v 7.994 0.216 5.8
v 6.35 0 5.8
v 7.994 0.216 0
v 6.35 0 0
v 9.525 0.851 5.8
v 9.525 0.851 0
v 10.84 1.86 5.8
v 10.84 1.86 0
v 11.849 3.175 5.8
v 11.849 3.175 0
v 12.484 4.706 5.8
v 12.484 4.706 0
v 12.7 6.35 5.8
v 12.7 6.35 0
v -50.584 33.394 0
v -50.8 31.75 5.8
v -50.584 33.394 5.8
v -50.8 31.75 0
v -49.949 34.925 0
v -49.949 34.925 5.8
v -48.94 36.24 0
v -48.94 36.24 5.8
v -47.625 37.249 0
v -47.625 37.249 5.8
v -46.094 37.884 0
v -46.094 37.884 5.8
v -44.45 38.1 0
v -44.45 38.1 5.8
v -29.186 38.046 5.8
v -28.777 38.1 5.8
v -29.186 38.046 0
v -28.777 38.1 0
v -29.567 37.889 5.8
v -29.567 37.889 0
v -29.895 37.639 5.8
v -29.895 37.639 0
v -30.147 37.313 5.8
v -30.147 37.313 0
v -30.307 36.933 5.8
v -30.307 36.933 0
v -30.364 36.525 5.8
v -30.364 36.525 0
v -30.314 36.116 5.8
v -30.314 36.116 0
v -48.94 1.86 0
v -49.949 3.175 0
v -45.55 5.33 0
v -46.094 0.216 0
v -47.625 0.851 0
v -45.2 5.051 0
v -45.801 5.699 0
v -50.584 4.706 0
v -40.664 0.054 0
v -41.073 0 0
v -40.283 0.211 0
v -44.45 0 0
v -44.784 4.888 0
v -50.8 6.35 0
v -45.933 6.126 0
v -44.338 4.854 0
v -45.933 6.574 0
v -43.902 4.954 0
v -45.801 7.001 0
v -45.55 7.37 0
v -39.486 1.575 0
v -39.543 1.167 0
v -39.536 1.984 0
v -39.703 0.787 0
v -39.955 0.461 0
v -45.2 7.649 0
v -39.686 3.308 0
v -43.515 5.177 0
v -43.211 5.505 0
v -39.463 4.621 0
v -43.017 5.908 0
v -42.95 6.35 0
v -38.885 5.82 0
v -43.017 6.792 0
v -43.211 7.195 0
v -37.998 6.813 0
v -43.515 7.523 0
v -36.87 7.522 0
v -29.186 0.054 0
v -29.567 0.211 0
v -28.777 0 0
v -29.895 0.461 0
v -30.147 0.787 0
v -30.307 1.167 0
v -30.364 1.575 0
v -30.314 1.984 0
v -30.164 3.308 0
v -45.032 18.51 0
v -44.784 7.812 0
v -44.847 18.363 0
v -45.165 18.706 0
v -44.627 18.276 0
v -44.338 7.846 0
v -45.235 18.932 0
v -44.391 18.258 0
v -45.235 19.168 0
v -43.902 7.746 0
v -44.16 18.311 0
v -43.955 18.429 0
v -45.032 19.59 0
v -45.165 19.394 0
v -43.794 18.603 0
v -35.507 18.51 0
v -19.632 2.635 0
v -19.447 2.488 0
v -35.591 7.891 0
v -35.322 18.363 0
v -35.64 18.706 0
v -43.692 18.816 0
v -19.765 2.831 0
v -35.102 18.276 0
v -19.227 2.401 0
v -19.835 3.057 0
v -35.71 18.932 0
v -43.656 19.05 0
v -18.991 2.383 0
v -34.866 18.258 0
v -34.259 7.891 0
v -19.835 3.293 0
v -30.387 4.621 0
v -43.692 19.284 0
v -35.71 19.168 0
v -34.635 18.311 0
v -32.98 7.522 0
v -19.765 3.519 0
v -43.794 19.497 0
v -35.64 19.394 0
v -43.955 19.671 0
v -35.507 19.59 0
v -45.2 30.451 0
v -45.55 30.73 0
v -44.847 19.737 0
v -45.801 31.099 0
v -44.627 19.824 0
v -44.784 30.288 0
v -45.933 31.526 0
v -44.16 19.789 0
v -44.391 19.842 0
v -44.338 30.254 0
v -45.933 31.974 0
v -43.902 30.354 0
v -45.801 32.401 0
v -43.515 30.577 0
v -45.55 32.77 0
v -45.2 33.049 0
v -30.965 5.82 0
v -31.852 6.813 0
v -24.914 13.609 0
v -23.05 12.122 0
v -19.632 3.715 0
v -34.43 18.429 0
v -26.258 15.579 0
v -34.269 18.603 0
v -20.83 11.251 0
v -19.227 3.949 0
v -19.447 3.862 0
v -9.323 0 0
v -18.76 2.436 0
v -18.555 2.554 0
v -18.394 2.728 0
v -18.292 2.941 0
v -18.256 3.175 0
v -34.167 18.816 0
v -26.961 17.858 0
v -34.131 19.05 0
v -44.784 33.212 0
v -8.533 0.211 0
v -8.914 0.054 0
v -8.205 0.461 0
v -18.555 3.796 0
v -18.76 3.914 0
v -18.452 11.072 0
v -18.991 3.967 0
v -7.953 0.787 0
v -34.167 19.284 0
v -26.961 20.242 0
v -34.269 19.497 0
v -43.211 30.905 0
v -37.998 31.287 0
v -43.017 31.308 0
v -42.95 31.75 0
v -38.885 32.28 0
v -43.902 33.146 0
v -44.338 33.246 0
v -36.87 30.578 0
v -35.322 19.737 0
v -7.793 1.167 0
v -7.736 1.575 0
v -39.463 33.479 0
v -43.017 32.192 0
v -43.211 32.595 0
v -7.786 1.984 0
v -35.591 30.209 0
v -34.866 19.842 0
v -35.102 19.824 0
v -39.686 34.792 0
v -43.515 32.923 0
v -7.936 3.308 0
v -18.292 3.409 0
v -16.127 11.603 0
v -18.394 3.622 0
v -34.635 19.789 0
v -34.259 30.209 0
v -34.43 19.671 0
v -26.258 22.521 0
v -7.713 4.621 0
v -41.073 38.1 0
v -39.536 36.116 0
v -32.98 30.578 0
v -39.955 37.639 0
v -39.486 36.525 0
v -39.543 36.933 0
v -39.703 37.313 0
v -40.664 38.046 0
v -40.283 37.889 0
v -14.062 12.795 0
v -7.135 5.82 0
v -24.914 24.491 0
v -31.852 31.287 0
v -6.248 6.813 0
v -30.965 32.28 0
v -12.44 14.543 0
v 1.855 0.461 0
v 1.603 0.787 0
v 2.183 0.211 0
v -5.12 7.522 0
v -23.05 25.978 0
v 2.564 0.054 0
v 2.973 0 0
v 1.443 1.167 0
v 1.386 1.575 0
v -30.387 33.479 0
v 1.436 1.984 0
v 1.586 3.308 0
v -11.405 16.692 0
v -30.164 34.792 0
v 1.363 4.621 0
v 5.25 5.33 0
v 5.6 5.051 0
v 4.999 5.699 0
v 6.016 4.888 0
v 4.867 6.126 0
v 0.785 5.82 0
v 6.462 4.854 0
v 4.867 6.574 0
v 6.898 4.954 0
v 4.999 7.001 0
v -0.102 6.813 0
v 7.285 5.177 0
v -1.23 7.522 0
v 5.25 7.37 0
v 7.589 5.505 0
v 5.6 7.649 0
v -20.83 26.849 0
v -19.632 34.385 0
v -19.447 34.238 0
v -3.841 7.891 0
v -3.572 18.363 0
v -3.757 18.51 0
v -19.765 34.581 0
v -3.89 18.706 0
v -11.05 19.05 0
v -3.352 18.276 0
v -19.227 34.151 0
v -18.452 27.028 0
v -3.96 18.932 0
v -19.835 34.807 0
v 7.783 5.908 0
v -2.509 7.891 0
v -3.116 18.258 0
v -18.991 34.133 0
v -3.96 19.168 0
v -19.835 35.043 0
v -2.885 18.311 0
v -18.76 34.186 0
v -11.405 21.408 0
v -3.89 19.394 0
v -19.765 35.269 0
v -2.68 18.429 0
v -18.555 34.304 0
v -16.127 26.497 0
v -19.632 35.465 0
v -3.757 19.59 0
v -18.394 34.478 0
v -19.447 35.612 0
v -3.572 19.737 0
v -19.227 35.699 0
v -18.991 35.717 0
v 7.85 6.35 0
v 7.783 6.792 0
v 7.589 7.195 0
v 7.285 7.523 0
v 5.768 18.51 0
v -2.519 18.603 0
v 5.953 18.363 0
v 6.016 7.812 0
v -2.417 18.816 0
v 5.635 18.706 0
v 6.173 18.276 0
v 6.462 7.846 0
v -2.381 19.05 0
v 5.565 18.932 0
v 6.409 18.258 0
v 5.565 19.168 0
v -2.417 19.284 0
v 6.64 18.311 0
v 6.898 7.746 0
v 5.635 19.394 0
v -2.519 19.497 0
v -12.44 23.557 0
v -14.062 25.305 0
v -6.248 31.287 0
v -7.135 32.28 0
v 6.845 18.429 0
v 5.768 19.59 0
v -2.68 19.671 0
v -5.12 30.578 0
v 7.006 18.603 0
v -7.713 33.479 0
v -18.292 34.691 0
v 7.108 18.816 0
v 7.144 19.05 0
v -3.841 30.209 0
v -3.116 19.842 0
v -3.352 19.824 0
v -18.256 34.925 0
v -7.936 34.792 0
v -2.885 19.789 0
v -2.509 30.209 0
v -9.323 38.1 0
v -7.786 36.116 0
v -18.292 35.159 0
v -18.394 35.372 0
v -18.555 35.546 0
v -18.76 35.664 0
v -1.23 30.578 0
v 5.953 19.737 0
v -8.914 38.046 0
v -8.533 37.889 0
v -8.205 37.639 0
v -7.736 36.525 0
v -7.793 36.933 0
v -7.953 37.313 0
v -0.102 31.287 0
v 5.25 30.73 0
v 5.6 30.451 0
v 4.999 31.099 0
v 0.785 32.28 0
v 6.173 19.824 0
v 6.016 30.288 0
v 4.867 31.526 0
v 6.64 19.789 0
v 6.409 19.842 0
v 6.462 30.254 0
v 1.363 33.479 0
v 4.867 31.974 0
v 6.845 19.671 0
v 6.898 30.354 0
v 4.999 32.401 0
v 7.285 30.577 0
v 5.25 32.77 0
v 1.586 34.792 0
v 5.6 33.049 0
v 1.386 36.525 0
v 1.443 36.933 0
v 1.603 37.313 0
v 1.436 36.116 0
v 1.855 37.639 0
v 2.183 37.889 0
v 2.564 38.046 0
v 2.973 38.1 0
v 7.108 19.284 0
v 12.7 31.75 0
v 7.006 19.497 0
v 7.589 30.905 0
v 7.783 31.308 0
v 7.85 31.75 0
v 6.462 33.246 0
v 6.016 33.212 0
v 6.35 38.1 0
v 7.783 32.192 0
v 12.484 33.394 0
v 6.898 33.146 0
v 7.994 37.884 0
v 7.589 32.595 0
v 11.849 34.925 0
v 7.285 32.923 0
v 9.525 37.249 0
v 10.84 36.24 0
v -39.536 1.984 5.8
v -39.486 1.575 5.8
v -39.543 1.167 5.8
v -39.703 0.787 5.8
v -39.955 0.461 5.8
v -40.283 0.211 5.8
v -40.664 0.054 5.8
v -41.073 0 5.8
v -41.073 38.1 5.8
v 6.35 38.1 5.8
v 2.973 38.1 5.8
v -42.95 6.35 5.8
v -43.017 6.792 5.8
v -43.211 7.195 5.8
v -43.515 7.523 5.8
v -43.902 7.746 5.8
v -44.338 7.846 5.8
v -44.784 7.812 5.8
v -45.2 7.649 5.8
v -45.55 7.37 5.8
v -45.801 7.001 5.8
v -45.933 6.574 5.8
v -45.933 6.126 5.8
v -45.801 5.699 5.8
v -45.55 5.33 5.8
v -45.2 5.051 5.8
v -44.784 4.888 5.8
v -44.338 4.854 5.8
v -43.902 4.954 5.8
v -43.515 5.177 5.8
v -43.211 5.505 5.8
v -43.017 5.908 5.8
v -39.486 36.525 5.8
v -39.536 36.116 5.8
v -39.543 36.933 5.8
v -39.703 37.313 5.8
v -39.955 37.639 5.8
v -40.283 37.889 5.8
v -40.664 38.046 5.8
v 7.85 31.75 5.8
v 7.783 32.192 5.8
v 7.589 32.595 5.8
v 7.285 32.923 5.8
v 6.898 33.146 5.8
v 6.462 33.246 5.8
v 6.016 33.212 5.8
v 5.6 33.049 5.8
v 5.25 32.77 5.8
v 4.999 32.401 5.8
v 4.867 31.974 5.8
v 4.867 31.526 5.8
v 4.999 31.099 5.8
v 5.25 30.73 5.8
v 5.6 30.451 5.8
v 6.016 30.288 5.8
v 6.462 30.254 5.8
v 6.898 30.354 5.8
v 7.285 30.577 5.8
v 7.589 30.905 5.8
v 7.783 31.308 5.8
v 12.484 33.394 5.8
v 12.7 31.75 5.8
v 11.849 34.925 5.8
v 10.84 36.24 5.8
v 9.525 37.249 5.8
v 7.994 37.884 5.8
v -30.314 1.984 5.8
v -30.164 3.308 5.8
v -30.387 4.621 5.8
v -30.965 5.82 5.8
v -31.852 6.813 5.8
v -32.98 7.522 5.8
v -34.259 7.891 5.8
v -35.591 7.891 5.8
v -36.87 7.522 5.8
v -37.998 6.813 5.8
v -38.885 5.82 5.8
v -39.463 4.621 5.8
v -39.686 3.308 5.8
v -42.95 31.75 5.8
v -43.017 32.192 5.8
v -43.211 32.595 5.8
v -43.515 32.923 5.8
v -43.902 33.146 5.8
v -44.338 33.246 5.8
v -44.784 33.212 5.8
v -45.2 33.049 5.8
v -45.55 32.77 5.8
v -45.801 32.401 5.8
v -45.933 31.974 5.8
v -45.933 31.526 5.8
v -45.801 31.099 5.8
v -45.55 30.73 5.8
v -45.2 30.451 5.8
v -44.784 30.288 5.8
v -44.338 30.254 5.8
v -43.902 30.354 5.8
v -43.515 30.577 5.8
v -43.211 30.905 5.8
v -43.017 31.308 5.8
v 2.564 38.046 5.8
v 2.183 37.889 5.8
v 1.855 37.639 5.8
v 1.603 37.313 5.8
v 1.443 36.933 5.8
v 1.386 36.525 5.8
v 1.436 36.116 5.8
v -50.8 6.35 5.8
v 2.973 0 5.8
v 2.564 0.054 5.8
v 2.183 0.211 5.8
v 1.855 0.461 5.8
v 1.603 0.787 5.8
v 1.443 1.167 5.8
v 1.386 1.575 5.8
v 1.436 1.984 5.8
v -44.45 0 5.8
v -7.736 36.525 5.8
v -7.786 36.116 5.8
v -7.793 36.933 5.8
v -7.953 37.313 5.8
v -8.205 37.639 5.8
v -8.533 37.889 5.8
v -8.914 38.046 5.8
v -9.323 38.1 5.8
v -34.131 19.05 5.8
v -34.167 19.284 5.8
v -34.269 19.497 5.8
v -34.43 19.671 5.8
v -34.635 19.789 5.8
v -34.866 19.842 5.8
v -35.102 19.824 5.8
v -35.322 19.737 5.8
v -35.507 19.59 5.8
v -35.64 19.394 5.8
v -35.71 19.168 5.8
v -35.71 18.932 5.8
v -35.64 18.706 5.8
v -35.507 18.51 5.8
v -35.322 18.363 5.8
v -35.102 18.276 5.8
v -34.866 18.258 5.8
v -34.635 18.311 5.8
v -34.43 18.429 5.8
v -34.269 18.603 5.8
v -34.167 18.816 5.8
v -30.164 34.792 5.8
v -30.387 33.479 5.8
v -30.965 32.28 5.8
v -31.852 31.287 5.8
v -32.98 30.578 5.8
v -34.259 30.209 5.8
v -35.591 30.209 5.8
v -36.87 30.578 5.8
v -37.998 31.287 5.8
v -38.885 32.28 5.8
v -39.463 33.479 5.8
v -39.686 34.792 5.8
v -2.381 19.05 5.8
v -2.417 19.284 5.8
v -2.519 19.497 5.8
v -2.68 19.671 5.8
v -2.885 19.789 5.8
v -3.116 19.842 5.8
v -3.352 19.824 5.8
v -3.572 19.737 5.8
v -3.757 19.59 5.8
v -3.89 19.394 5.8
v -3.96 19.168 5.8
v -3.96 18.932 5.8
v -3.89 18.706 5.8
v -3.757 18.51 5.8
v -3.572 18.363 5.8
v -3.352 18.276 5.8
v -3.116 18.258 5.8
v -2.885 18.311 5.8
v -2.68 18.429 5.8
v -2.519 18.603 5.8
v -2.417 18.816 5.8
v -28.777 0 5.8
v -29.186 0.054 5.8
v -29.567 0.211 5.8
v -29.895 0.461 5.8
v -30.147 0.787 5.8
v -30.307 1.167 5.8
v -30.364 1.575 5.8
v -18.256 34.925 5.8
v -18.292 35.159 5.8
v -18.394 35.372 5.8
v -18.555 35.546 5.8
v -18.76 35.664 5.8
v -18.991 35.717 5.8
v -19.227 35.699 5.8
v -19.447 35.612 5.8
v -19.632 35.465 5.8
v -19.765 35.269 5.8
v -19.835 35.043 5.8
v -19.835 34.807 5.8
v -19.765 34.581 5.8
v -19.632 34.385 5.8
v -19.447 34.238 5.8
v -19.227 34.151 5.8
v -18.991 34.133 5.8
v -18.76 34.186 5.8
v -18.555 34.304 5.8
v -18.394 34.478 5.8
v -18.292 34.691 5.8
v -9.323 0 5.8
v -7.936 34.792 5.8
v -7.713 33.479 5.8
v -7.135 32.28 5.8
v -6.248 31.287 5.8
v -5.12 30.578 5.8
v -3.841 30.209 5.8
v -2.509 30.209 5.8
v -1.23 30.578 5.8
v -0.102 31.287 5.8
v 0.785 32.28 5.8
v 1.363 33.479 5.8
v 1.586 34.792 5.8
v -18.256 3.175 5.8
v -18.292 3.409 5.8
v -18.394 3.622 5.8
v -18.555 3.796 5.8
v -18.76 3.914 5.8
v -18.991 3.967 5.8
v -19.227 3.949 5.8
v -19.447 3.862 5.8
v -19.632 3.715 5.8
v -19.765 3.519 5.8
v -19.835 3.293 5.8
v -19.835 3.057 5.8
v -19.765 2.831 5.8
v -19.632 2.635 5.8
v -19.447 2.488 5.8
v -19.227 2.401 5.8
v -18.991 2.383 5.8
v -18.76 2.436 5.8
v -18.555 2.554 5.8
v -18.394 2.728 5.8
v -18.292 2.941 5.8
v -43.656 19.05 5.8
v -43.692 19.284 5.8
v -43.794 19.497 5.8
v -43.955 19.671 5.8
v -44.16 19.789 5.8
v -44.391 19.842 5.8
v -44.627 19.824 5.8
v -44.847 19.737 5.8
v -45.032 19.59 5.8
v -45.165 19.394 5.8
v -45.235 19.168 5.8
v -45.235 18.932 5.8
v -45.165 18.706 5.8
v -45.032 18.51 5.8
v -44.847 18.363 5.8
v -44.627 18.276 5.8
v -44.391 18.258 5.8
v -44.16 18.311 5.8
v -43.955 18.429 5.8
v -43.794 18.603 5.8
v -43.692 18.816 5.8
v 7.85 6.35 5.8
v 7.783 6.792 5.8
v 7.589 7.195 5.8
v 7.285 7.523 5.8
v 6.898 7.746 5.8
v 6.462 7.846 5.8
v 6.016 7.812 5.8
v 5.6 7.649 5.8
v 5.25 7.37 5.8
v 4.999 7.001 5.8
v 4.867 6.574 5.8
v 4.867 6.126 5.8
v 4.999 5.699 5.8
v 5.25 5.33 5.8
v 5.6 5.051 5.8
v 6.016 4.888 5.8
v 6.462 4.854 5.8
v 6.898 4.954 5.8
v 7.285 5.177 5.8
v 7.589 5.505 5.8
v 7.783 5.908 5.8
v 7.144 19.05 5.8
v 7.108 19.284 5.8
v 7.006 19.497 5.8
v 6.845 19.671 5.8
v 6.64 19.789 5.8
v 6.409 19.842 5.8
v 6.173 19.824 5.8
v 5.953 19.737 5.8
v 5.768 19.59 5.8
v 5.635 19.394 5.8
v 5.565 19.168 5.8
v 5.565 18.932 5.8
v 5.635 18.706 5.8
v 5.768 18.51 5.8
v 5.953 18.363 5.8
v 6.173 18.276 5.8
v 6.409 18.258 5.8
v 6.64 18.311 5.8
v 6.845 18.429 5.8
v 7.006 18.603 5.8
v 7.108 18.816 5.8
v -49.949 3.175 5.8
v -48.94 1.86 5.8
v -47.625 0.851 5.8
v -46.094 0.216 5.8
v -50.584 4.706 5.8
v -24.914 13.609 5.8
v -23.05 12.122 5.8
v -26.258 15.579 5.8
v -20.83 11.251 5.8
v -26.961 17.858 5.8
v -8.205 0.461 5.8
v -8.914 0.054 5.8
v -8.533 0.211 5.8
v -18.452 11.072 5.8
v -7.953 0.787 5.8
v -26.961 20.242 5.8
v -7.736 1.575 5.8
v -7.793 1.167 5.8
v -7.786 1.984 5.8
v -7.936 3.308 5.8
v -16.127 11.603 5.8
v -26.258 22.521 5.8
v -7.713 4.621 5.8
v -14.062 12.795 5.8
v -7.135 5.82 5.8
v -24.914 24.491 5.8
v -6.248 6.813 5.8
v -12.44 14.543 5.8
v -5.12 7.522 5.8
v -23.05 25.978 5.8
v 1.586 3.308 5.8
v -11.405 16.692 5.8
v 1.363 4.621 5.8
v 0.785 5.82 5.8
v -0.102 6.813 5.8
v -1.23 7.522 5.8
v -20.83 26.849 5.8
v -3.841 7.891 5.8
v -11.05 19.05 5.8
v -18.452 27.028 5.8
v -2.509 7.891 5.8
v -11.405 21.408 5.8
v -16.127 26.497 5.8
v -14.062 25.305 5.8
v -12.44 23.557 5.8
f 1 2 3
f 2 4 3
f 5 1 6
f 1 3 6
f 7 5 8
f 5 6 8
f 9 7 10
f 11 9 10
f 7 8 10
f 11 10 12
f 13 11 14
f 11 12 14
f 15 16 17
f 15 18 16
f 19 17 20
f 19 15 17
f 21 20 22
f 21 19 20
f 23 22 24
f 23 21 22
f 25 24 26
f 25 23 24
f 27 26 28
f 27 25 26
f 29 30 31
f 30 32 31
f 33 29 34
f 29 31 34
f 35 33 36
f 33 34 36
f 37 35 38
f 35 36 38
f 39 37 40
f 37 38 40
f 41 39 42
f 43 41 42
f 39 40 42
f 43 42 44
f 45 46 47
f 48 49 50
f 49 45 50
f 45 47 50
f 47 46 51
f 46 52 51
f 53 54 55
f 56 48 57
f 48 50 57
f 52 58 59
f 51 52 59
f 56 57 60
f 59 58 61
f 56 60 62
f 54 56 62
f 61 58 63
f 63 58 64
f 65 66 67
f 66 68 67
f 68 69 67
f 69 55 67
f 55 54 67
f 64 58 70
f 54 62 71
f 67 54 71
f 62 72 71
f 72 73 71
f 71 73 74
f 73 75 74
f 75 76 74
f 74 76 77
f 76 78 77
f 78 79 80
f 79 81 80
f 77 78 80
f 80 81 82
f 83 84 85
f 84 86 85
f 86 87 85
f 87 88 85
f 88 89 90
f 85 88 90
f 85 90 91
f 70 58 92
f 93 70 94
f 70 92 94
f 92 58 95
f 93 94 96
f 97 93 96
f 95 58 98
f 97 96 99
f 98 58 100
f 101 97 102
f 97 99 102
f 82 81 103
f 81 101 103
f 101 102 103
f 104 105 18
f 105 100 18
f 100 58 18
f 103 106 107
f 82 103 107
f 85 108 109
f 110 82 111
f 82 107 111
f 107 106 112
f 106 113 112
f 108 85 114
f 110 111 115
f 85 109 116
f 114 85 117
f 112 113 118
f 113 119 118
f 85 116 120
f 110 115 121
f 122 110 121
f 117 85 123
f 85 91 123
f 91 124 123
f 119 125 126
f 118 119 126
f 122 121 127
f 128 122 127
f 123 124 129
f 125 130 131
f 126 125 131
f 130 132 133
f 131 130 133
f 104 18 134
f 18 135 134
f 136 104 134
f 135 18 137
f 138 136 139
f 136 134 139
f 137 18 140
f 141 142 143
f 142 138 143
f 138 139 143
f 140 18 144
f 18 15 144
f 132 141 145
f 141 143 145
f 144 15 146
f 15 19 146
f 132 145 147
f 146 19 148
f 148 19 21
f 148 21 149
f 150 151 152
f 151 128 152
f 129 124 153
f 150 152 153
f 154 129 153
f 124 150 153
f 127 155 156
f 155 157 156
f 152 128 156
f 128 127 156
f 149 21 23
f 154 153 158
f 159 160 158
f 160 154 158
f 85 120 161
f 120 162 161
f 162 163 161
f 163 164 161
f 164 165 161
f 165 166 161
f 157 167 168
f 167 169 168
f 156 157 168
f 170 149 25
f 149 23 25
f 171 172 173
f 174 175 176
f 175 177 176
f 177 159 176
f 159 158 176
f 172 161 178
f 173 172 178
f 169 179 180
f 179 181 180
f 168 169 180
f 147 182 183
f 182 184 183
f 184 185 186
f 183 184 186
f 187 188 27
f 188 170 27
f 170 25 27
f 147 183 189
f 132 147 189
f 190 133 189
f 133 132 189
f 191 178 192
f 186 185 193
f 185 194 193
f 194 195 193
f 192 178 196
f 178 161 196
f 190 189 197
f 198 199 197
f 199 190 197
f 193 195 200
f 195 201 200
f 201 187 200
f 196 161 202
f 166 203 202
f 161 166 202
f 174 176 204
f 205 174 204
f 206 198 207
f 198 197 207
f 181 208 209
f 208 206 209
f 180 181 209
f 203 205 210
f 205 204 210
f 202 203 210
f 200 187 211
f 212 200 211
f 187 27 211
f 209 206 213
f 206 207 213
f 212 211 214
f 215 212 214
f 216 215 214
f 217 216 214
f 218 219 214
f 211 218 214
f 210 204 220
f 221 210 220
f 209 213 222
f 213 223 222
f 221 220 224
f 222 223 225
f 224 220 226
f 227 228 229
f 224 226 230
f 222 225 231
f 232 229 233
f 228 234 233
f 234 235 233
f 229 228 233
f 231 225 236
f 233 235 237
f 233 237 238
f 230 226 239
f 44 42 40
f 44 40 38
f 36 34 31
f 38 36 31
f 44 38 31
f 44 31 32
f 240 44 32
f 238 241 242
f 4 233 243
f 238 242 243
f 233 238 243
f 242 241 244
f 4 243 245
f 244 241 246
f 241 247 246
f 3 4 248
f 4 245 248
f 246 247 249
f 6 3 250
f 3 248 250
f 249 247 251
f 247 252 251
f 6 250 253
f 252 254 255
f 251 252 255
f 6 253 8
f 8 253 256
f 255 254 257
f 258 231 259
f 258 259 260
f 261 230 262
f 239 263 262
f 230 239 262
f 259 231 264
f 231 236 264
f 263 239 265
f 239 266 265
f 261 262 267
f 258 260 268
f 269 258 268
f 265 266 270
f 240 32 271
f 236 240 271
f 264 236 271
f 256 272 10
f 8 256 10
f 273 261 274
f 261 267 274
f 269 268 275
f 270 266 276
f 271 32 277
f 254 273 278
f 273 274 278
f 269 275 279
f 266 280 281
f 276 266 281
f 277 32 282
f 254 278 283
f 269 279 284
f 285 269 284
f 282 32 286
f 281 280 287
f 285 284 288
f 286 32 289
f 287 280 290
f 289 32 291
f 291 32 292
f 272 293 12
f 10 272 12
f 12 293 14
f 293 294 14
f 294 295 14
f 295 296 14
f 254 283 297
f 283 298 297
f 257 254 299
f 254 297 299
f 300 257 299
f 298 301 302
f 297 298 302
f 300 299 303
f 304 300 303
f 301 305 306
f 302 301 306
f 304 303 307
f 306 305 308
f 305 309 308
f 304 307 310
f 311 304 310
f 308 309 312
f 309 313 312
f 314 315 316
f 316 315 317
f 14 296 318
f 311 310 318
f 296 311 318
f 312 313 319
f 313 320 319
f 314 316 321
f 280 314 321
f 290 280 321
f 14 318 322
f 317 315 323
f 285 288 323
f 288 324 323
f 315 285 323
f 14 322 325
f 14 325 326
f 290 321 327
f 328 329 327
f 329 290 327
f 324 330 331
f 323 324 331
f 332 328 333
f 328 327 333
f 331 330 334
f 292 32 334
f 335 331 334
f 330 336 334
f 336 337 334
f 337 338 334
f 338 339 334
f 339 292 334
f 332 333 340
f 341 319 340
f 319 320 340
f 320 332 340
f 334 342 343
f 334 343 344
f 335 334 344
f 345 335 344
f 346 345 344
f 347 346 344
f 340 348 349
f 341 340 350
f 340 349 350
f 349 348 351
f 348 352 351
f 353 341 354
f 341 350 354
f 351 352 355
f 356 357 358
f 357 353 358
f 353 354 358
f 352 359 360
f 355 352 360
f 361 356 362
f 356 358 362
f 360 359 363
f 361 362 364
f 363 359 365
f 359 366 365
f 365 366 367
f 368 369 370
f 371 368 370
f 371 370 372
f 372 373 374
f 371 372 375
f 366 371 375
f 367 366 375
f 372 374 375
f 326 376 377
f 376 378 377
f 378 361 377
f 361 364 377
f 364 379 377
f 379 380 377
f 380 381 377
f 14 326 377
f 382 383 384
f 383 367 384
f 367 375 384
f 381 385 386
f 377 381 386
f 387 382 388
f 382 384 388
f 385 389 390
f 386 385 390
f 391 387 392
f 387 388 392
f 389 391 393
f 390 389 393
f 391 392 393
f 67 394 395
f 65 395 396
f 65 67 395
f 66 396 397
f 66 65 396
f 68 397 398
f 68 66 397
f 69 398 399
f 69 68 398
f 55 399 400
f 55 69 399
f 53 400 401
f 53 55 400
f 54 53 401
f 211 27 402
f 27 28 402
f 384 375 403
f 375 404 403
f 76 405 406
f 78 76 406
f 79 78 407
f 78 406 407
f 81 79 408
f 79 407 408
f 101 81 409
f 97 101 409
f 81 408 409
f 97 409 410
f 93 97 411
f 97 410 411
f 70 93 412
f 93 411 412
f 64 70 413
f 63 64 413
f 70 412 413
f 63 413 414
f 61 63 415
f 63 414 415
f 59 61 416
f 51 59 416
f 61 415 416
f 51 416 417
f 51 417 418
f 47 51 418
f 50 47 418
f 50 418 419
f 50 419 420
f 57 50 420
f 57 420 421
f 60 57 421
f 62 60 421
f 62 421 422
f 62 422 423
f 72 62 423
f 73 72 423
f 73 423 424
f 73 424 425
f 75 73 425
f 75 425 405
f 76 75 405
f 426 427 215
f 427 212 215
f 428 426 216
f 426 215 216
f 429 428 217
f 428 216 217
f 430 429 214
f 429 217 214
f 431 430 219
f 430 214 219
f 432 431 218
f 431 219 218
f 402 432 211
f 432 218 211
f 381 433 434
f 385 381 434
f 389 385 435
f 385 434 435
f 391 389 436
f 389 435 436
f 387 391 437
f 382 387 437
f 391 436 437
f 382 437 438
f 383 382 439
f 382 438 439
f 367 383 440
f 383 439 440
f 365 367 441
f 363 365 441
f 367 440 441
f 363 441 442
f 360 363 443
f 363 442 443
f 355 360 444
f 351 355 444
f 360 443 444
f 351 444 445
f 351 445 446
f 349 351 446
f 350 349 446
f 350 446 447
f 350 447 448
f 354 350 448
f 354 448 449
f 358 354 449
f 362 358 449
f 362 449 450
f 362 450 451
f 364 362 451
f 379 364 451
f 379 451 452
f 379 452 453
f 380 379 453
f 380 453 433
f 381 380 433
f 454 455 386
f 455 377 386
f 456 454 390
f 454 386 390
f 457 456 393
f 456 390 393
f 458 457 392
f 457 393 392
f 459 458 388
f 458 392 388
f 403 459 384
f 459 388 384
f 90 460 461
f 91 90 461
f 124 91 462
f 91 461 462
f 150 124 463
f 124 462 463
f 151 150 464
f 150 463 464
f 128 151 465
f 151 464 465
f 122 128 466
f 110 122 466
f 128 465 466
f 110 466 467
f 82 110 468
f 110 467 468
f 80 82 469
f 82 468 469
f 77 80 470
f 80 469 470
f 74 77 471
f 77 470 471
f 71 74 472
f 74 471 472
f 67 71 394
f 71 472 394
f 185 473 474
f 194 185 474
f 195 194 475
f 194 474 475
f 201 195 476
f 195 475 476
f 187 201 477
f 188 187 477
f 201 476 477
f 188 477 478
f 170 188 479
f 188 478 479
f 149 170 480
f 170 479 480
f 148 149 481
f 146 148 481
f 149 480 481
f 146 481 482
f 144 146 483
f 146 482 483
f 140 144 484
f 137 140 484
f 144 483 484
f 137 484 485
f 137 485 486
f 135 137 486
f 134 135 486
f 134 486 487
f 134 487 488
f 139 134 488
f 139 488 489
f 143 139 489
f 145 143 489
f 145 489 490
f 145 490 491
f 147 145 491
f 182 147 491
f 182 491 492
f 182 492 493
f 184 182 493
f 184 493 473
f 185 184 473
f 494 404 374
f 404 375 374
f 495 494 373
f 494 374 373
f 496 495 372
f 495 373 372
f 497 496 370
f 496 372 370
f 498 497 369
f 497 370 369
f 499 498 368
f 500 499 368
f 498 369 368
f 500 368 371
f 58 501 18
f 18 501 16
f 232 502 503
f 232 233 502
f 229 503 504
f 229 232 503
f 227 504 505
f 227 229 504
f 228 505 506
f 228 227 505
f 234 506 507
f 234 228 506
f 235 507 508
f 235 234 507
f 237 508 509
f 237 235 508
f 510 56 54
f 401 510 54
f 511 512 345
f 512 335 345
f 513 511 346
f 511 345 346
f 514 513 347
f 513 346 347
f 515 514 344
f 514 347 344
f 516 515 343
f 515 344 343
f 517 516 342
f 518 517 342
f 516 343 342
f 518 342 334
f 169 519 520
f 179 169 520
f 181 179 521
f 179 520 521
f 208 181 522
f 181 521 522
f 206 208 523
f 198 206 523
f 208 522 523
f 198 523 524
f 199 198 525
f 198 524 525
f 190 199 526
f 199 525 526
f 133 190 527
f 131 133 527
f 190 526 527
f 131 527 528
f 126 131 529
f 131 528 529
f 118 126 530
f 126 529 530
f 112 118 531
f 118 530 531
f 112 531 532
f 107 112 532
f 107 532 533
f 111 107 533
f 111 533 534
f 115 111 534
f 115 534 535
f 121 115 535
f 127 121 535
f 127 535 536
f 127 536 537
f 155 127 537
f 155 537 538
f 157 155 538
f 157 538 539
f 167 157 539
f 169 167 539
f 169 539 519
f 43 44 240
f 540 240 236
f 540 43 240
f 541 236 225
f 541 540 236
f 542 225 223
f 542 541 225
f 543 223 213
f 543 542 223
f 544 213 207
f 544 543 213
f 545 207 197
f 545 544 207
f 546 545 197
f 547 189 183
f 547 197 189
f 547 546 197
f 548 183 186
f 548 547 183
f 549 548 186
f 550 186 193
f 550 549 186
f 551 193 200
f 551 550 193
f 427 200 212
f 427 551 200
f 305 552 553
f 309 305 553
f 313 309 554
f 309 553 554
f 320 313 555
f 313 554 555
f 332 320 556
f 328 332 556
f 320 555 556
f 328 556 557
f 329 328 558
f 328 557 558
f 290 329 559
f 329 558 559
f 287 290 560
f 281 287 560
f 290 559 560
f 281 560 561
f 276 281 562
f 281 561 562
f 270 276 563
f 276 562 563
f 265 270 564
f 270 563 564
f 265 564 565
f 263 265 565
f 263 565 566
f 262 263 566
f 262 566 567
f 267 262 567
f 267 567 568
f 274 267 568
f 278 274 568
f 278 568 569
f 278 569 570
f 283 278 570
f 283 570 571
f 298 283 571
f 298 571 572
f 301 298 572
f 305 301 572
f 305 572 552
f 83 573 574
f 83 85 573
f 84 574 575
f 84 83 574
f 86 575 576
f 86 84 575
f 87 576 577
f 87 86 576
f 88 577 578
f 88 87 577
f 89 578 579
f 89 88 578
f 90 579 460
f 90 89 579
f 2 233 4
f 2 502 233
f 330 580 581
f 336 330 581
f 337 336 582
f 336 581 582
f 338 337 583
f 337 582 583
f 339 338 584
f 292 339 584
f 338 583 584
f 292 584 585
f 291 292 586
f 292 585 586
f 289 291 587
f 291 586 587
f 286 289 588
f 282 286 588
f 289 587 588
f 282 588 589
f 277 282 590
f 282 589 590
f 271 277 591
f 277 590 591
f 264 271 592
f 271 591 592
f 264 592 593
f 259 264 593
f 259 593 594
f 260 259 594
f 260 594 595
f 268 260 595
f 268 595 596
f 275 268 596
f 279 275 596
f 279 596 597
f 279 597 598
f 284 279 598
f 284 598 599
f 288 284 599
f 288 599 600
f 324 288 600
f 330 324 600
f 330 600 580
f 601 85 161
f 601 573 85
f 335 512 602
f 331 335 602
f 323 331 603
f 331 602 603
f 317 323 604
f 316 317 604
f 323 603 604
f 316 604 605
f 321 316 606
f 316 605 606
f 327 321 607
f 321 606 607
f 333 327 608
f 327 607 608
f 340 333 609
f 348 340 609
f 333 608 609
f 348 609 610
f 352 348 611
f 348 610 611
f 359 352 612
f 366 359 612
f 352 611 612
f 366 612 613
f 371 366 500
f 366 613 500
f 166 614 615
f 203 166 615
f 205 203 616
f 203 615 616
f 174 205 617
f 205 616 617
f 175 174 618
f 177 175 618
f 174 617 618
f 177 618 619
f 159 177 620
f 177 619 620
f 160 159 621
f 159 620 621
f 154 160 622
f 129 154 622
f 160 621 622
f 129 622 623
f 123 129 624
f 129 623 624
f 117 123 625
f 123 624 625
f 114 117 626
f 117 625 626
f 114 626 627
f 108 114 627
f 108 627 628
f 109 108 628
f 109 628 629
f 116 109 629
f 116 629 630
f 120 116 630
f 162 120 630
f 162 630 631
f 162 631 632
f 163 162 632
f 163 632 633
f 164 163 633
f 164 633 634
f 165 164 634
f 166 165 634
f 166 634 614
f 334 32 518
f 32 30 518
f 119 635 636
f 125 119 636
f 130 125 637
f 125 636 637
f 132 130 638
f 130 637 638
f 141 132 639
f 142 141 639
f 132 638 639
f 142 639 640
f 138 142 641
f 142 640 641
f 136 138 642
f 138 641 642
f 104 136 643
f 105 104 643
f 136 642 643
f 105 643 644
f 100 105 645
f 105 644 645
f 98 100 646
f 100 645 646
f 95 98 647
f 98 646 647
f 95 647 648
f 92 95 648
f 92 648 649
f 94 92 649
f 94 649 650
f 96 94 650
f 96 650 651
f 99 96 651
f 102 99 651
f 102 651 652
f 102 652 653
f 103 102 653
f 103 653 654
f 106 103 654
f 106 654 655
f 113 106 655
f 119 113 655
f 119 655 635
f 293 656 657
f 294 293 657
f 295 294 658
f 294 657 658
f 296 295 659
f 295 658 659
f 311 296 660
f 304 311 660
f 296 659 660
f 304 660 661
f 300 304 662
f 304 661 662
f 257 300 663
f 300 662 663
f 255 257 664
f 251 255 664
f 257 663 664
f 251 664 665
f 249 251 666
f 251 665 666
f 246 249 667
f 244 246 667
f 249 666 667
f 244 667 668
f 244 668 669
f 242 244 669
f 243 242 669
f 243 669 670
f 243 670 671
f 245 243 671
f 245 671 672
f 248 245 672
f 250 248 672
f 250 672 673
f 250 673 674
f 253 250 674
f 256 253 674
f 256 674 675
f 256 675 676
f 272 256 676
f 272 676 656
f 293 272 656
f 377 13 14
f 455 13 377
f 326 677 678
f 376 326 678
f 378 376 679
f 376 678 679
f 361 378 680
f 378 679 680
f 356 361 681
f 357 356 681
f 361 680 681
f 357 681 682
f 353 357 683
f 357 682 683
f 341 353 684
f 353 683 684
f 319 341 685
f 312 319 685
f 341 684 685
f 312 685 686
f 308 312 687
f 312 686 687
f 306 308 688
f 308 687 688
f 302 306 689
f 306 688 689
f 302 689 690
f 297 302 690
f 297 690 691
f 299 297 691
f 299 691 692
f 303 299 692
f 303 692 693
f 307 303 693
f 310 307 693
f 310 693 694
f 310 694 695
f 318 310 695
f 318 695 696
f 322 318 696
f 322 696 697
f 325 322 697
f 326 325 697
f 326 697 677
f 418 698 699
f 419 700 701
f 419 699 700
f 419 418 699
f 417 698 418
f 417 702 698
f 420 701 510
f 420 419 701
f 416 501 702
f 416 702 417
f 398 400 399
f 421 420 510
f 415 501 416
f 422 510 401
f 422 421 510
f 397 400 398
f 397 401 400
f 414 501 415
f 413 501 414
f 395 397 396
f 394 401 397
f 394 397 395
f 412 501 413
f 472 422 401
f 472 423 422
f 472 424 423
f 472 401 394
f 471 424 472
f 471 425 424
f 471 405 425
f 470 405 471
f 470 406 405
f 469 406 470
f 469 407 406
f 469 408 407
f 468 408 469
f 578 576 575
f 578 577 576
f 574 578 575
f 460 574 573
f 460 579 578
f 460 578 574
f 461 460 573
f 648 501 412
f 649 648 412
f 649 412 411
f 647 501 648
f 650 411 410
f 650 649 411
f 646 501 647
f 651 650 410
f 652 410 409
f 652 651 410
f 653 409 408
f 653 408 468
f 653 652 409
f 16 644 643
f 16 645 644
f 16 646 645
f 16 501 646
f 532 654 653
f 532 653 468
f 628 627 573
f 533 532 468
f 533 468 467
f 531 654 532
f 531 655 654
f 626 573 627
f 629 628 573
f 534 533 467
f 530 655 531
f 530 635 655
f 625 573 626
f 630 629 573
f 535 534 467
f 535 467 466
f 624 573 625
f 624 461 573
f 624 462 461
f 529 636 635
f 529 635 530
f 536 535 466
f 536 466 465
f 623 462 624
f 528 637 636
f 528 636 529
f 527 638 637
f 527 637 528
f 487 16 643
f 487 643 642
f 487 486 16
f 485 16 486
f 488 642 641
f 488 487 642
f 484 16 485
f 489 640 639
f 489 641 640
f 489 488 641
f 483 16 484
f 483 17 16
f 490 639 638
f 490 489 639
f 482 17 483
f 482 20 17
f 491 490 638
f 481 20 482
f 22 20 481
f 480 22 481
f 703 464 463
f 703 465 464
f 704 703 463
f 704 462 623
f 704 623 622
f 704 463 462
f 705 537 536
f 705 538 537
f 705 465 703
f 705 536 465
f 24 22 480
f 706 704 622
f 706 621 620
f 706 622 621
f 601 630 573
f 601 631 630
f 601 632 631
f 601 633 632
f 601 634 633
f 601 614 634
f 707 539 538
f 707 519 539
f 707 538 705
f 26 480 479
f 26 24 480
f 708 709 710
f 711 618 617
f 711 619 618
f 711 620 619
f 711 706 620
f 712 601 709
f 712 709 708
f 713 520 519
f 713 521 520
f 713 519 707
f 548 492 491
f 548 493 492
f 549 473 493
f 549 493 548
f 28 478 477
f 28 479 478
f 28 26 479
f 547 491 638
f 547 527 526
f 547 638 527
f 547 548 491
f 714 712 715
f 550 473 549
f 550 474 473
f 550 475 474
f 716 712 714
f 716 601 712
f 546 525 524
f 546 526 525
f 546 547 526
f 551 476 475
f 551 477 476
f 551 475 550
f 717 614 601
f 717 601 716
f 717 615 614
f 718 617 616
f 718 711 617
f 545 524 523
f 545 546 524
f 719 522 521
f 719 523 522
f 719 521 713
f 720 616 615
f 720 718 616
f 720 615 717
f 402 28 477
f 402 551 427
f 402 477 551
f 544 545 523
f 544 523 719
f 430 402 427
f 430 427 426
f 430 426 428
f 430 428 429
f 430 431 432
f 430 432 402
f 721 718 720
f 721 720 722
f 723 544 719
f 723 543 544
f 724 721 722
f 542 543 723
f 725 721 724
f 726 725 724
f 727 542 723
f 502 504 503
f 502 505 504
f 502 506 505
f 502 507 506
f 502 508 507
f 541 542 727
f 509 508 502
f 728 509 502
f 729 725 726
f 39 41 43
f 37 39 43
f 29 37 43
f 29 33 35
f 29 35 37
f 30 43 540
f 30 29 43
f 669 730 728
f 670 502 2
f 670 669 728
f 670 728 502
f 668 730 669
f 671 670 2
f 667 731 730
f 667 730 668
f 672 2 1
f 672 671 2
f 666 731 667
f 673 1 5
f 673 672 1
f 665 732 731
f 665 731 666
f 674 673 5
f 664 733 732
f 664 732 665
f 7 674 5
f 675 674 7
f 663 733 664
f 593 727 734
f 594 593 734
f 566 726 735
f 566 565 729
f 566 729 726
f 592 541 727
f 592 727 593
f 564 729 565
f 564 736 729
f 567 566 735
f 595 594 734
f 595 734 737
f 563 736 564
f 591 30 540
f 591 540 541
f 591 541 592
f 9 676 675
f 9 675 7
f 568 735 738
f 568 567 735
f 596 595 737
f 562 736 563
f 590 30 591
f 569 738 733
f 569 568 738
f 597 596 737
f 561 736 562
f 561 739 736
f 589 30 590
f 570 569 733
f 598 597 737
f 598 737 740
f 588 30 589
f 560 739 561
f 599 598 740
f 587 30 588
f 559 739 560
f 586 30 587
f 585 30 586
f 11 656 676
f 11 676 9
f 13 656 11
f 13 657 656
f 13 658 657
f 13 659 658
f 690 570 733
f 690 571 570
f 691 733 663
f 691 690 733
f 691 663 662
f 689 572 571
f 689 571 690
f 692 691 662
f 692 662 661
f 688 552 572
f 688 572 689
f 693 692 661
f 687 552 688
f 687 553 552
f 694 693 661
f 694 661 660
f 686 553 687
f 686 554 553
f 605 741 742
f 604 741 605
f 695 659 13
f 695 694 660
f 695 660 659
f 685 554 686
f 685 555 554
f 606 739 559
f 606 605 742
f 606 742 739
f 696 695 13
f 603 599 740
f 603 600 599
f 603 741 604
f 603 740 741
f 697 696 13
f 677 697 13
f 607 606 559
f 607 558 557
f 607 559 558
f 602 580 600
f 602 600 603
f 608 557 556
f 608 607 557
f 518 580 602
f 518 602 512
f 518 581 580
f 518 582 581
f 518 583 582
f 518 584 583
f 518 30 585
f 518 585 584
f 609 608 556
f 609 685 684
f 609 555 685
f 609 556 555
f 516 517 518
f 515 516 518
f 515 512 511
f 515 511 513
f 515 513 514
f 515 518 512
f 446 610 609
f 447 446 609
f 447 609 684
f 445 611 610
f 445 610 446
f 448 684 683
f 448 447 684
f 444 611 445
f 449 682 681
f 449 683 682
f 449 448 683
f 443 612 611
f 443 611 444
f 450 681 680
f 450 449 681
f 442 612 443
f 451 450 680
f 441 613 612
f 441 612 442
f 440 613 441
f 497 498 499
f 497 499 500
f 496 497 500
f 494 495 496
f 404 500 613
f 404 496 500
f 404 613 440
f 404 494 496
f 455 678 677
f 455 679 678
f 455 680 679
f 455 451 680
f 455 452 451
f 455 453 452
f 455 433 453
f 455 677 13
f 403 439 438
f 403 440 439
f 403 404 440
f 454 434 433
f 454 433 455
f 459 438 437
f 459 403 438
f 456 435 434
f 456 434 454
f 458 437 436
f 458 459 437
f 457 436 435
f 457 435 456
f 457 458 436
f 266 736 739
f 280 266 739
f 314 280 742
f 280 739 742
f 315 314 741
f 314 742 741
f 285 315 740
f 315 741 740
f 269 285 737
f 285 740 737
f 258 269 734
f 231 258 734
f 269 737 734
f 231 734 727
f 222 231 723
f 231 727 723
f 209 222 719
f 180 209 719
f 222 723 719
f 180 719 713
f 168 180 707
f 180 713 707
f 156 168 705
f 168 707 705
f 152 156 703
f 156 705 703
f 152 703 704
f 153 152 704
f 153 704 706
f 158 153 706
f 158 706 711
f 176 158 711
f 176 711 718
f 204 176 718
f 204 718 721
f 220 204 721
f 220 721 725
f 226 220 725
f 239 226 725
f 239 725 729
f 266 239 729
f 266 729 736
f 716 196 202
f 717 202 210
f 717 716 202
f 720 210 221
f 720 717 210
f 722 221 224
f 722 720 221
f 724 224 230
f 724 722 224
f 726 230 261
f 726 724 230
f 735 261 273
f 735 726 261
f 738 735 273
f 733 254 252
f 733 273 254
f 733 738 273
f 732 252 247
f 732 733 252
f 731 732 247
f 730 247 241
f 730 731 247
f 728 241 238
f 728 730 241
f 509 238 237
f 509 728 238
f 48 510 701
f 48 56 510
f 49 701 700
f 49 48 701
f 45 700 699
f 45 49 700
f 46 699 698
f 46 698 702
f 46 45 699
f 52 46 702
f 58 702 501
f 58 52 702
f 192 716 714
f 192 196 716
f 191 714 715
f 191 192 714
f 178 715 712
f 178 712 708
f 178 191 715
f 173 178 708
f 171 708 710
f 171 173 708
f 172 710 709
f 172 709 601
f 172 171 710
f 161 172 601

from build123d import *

# Parameters (mm, degrees)
SKETCH1_W                       = 38.1
SKETCH1_H                       = 38.1
BOSS_EXTRUDE1_DEPTH             = 5.8
SKETCH2_R                       = 8
CUT_EXTRUDE1_DEPTH              = 12.7
SKETCH4_R                       = 0.79375
CUT_EXTRUDE3_DEPTH              = 55.19280395
SKETCH6_W                       = 12.7
SKETCH6_H                       = 38.1
BOSS_EXTRUDE2_DEPTH             = 5.8
CUT_EXTRUDE2_DEPTH              = 64.764331722
M3X0_5_TAPPED_HOLE1_D           = 2.5
M3X0_5_TAPPED_HOLE1_DEPTH       = 7.5
M3X0_5_TAPPED_HOLE1_CBORE_D     = 3
M3X0_5_TAPPED_HOLE1_CBORE_DEPTH = 6
M3X0_5_TAPPED_HOLE1_TIP         = 0.751075774
SKETCH9_R                       = 0.79375
CUT_EXTRUDE4_DEPTH              = 64.764331722
FILLET1_R                       = 6.35
FILLET2_R                       = 1.5875


with BuildPart() as part:
    # Sketch1 → Boss-Extrude1 (new body)
    with BuildSketch(Plane.XY):
        with Locations((-19.05, 19.05)):
            Rectangle(SKETCH1_W, SKETCH1_H)
    extrude(amount=BOSS_EXTRUDE1_DEPTH)

    # Sketch2 → Cut-Extrude1 (cut)
    with BuildSketch(Plane.XY.offset(5.8)):
        with Locations((-19.05, 19.05)):
            Circle(SKETCH2_R)
    extrude(amount=-CUT_EXTRUDE1_DEPTH, mode=Mode.SUBTRACT)

    # Sketch4 → Cut-Extrude3 (cut, through all)
    with BuildSketch(Plane.XY.offset(5.8)):
        with Locations((-34.925, 19.05)):
            Circle(SKETCH4_R)
        with Locations((-19.05, 34.925)):
            Circle(SKETCH4_R)
        with Locations((-3.175, 19.05)):
            Circle(SKETCH4_R)
        with Locations((-19.05, 3.175)):
            Circle(SKETCH4_R)
    extrude(amount=-CUT_EXTRUDE3_DEPTH, mode=Mode.SUBTRACT)

    # Sketch6 → Boss-Extrude2 (add, through all)
    with BuildSketch(Plane.XY.offset(5.8)):
        with Locations((6.35, 19.05)):
            Rectangle(SKETCH6_W, SKETCH6_H)
        with Locations((-44.45, 19.05)):
            Rectangle(SKETCH6_W, SKETCH6_H)
    extrude(amount=-BOSS_EXTRUDE2_DEPTH)

    # Sketch3 → Cut-Extrude2 (cut, through all)
    with BuildSketch(Plane.XY.offset(5.8)):
        with BuildLine():
            Line((-38.1, 38.1), (-31.375242086, 38.1))
            ThreePointArc((-31.375242086, 38.1), (-34.925, 30.1625), (-38.474757914, 38.1))
            Line((-38.474757914, 38.1), (-38.1, 38.1))
        make_face()
        with BuildLine():
            Line((0, 38.1), (-6.724757914, 38.1))
            ThreePointArc((-6.724757914, 38.1), (-3.175, 30.1625), (0.374757914, 38.1))
            Line((0.374757914, 38.1), (0, 38.1))
        make_face()
        with BuildLine():
            Line((0, 0), (-6.724757914, 0))
            ThreePointArc((-6.724757914, 0), (-3.175, 7.9375), (0.374757914, 0))
            Line((0.374757914, 0), (0, 0))
        make_face()
        with BuildLine():
            Line((-38.1, 0), (-31.375242086, 0))
            ThreePointArc((-31.375242086, 0), (-34.925, 7.9375), (-38.474757914, 0))
            Line((-38.474757914, 0), (-38.1, 0))
        make_face()
    extrude(amount=-CUT_EXTRUDE2_DEPTH, mode=Mode.SUBTRACT)

    # M3x0.5 Tapped Hole1
    with Locations(Plane.XY.offset(5.8)):
        with Locations((-44.45, 31.75), (6.35, 31.75), (6.35, 6.35), (-44.45, 6.35)):
            CounterBoreHole(M3X0_5_TAPPED_HOLE1_D / 2, M3X0_5_TAPPED_HOLE1_CBORE_D / 2, M3X0_5_TAPPED_HOLE1_CBORE_DEPTH, depth=M3X0_5_TAPPED_HOLE1_DEPTH)
            with Locations((0, 0, -(M3X0_5_TAPPED_HOLE1_DEPTH + M3X0_5_TAPPED_HOLE1_TIP / 2))):  # 118° drill point
                Cone(0, M3X0_5_TAPPED_HOLE1_D / 2, M3X0_5_TAPPED_HOLE1_TIP, mode=Mode.SUBTRACT)

    # Sketch9 → Cut-Extrude4 (cut, through all)
    with BuildSketch(Plane.XY.offset(5.8)):
        with Locations((-44.45, 19.05)):
            Circle(SKETCH9_R)
        with Locations((6.35, 19.05)):
            Circle(SKETCH9_R)
    extrude(amount=-CUT_EXTRUDE4_DEPTH, mode=Mode.SUBTRACT)

    # Fillet1
    fillet1_edges = [part.edges().sort_by_distance(p)[0] for p in [
        (12.7, 38.1, 2.9),
        (12.7, 0, 2.9),
        (-50.8, 0, 2.9),
        (-50.8, 38.1, 2.9),
    ]]
    fillet(fillet1_edges, radius=FILLET1_R)

    # Fillet2
    fillet2_edges = [part.edges().sort_by_distance(p)[0] for p in [
        (-38.474757914, 38.1, 2.9),
        (-31.375242086, 38.1, 2.9),
        (0.374757914, 0, 2.9),
        (-6.724757914, 0, 2.9),
        (0.374757914, 38.1, 2.9),
        (-6.724757914, 38.1, 2.9),
        (-38.474757914, 0, 2.9),
        (-31.375242086, 0, 2.9),
    ]]
    fillet(fillet2_edges, radius=FILLET2_R)


solid = part.part
